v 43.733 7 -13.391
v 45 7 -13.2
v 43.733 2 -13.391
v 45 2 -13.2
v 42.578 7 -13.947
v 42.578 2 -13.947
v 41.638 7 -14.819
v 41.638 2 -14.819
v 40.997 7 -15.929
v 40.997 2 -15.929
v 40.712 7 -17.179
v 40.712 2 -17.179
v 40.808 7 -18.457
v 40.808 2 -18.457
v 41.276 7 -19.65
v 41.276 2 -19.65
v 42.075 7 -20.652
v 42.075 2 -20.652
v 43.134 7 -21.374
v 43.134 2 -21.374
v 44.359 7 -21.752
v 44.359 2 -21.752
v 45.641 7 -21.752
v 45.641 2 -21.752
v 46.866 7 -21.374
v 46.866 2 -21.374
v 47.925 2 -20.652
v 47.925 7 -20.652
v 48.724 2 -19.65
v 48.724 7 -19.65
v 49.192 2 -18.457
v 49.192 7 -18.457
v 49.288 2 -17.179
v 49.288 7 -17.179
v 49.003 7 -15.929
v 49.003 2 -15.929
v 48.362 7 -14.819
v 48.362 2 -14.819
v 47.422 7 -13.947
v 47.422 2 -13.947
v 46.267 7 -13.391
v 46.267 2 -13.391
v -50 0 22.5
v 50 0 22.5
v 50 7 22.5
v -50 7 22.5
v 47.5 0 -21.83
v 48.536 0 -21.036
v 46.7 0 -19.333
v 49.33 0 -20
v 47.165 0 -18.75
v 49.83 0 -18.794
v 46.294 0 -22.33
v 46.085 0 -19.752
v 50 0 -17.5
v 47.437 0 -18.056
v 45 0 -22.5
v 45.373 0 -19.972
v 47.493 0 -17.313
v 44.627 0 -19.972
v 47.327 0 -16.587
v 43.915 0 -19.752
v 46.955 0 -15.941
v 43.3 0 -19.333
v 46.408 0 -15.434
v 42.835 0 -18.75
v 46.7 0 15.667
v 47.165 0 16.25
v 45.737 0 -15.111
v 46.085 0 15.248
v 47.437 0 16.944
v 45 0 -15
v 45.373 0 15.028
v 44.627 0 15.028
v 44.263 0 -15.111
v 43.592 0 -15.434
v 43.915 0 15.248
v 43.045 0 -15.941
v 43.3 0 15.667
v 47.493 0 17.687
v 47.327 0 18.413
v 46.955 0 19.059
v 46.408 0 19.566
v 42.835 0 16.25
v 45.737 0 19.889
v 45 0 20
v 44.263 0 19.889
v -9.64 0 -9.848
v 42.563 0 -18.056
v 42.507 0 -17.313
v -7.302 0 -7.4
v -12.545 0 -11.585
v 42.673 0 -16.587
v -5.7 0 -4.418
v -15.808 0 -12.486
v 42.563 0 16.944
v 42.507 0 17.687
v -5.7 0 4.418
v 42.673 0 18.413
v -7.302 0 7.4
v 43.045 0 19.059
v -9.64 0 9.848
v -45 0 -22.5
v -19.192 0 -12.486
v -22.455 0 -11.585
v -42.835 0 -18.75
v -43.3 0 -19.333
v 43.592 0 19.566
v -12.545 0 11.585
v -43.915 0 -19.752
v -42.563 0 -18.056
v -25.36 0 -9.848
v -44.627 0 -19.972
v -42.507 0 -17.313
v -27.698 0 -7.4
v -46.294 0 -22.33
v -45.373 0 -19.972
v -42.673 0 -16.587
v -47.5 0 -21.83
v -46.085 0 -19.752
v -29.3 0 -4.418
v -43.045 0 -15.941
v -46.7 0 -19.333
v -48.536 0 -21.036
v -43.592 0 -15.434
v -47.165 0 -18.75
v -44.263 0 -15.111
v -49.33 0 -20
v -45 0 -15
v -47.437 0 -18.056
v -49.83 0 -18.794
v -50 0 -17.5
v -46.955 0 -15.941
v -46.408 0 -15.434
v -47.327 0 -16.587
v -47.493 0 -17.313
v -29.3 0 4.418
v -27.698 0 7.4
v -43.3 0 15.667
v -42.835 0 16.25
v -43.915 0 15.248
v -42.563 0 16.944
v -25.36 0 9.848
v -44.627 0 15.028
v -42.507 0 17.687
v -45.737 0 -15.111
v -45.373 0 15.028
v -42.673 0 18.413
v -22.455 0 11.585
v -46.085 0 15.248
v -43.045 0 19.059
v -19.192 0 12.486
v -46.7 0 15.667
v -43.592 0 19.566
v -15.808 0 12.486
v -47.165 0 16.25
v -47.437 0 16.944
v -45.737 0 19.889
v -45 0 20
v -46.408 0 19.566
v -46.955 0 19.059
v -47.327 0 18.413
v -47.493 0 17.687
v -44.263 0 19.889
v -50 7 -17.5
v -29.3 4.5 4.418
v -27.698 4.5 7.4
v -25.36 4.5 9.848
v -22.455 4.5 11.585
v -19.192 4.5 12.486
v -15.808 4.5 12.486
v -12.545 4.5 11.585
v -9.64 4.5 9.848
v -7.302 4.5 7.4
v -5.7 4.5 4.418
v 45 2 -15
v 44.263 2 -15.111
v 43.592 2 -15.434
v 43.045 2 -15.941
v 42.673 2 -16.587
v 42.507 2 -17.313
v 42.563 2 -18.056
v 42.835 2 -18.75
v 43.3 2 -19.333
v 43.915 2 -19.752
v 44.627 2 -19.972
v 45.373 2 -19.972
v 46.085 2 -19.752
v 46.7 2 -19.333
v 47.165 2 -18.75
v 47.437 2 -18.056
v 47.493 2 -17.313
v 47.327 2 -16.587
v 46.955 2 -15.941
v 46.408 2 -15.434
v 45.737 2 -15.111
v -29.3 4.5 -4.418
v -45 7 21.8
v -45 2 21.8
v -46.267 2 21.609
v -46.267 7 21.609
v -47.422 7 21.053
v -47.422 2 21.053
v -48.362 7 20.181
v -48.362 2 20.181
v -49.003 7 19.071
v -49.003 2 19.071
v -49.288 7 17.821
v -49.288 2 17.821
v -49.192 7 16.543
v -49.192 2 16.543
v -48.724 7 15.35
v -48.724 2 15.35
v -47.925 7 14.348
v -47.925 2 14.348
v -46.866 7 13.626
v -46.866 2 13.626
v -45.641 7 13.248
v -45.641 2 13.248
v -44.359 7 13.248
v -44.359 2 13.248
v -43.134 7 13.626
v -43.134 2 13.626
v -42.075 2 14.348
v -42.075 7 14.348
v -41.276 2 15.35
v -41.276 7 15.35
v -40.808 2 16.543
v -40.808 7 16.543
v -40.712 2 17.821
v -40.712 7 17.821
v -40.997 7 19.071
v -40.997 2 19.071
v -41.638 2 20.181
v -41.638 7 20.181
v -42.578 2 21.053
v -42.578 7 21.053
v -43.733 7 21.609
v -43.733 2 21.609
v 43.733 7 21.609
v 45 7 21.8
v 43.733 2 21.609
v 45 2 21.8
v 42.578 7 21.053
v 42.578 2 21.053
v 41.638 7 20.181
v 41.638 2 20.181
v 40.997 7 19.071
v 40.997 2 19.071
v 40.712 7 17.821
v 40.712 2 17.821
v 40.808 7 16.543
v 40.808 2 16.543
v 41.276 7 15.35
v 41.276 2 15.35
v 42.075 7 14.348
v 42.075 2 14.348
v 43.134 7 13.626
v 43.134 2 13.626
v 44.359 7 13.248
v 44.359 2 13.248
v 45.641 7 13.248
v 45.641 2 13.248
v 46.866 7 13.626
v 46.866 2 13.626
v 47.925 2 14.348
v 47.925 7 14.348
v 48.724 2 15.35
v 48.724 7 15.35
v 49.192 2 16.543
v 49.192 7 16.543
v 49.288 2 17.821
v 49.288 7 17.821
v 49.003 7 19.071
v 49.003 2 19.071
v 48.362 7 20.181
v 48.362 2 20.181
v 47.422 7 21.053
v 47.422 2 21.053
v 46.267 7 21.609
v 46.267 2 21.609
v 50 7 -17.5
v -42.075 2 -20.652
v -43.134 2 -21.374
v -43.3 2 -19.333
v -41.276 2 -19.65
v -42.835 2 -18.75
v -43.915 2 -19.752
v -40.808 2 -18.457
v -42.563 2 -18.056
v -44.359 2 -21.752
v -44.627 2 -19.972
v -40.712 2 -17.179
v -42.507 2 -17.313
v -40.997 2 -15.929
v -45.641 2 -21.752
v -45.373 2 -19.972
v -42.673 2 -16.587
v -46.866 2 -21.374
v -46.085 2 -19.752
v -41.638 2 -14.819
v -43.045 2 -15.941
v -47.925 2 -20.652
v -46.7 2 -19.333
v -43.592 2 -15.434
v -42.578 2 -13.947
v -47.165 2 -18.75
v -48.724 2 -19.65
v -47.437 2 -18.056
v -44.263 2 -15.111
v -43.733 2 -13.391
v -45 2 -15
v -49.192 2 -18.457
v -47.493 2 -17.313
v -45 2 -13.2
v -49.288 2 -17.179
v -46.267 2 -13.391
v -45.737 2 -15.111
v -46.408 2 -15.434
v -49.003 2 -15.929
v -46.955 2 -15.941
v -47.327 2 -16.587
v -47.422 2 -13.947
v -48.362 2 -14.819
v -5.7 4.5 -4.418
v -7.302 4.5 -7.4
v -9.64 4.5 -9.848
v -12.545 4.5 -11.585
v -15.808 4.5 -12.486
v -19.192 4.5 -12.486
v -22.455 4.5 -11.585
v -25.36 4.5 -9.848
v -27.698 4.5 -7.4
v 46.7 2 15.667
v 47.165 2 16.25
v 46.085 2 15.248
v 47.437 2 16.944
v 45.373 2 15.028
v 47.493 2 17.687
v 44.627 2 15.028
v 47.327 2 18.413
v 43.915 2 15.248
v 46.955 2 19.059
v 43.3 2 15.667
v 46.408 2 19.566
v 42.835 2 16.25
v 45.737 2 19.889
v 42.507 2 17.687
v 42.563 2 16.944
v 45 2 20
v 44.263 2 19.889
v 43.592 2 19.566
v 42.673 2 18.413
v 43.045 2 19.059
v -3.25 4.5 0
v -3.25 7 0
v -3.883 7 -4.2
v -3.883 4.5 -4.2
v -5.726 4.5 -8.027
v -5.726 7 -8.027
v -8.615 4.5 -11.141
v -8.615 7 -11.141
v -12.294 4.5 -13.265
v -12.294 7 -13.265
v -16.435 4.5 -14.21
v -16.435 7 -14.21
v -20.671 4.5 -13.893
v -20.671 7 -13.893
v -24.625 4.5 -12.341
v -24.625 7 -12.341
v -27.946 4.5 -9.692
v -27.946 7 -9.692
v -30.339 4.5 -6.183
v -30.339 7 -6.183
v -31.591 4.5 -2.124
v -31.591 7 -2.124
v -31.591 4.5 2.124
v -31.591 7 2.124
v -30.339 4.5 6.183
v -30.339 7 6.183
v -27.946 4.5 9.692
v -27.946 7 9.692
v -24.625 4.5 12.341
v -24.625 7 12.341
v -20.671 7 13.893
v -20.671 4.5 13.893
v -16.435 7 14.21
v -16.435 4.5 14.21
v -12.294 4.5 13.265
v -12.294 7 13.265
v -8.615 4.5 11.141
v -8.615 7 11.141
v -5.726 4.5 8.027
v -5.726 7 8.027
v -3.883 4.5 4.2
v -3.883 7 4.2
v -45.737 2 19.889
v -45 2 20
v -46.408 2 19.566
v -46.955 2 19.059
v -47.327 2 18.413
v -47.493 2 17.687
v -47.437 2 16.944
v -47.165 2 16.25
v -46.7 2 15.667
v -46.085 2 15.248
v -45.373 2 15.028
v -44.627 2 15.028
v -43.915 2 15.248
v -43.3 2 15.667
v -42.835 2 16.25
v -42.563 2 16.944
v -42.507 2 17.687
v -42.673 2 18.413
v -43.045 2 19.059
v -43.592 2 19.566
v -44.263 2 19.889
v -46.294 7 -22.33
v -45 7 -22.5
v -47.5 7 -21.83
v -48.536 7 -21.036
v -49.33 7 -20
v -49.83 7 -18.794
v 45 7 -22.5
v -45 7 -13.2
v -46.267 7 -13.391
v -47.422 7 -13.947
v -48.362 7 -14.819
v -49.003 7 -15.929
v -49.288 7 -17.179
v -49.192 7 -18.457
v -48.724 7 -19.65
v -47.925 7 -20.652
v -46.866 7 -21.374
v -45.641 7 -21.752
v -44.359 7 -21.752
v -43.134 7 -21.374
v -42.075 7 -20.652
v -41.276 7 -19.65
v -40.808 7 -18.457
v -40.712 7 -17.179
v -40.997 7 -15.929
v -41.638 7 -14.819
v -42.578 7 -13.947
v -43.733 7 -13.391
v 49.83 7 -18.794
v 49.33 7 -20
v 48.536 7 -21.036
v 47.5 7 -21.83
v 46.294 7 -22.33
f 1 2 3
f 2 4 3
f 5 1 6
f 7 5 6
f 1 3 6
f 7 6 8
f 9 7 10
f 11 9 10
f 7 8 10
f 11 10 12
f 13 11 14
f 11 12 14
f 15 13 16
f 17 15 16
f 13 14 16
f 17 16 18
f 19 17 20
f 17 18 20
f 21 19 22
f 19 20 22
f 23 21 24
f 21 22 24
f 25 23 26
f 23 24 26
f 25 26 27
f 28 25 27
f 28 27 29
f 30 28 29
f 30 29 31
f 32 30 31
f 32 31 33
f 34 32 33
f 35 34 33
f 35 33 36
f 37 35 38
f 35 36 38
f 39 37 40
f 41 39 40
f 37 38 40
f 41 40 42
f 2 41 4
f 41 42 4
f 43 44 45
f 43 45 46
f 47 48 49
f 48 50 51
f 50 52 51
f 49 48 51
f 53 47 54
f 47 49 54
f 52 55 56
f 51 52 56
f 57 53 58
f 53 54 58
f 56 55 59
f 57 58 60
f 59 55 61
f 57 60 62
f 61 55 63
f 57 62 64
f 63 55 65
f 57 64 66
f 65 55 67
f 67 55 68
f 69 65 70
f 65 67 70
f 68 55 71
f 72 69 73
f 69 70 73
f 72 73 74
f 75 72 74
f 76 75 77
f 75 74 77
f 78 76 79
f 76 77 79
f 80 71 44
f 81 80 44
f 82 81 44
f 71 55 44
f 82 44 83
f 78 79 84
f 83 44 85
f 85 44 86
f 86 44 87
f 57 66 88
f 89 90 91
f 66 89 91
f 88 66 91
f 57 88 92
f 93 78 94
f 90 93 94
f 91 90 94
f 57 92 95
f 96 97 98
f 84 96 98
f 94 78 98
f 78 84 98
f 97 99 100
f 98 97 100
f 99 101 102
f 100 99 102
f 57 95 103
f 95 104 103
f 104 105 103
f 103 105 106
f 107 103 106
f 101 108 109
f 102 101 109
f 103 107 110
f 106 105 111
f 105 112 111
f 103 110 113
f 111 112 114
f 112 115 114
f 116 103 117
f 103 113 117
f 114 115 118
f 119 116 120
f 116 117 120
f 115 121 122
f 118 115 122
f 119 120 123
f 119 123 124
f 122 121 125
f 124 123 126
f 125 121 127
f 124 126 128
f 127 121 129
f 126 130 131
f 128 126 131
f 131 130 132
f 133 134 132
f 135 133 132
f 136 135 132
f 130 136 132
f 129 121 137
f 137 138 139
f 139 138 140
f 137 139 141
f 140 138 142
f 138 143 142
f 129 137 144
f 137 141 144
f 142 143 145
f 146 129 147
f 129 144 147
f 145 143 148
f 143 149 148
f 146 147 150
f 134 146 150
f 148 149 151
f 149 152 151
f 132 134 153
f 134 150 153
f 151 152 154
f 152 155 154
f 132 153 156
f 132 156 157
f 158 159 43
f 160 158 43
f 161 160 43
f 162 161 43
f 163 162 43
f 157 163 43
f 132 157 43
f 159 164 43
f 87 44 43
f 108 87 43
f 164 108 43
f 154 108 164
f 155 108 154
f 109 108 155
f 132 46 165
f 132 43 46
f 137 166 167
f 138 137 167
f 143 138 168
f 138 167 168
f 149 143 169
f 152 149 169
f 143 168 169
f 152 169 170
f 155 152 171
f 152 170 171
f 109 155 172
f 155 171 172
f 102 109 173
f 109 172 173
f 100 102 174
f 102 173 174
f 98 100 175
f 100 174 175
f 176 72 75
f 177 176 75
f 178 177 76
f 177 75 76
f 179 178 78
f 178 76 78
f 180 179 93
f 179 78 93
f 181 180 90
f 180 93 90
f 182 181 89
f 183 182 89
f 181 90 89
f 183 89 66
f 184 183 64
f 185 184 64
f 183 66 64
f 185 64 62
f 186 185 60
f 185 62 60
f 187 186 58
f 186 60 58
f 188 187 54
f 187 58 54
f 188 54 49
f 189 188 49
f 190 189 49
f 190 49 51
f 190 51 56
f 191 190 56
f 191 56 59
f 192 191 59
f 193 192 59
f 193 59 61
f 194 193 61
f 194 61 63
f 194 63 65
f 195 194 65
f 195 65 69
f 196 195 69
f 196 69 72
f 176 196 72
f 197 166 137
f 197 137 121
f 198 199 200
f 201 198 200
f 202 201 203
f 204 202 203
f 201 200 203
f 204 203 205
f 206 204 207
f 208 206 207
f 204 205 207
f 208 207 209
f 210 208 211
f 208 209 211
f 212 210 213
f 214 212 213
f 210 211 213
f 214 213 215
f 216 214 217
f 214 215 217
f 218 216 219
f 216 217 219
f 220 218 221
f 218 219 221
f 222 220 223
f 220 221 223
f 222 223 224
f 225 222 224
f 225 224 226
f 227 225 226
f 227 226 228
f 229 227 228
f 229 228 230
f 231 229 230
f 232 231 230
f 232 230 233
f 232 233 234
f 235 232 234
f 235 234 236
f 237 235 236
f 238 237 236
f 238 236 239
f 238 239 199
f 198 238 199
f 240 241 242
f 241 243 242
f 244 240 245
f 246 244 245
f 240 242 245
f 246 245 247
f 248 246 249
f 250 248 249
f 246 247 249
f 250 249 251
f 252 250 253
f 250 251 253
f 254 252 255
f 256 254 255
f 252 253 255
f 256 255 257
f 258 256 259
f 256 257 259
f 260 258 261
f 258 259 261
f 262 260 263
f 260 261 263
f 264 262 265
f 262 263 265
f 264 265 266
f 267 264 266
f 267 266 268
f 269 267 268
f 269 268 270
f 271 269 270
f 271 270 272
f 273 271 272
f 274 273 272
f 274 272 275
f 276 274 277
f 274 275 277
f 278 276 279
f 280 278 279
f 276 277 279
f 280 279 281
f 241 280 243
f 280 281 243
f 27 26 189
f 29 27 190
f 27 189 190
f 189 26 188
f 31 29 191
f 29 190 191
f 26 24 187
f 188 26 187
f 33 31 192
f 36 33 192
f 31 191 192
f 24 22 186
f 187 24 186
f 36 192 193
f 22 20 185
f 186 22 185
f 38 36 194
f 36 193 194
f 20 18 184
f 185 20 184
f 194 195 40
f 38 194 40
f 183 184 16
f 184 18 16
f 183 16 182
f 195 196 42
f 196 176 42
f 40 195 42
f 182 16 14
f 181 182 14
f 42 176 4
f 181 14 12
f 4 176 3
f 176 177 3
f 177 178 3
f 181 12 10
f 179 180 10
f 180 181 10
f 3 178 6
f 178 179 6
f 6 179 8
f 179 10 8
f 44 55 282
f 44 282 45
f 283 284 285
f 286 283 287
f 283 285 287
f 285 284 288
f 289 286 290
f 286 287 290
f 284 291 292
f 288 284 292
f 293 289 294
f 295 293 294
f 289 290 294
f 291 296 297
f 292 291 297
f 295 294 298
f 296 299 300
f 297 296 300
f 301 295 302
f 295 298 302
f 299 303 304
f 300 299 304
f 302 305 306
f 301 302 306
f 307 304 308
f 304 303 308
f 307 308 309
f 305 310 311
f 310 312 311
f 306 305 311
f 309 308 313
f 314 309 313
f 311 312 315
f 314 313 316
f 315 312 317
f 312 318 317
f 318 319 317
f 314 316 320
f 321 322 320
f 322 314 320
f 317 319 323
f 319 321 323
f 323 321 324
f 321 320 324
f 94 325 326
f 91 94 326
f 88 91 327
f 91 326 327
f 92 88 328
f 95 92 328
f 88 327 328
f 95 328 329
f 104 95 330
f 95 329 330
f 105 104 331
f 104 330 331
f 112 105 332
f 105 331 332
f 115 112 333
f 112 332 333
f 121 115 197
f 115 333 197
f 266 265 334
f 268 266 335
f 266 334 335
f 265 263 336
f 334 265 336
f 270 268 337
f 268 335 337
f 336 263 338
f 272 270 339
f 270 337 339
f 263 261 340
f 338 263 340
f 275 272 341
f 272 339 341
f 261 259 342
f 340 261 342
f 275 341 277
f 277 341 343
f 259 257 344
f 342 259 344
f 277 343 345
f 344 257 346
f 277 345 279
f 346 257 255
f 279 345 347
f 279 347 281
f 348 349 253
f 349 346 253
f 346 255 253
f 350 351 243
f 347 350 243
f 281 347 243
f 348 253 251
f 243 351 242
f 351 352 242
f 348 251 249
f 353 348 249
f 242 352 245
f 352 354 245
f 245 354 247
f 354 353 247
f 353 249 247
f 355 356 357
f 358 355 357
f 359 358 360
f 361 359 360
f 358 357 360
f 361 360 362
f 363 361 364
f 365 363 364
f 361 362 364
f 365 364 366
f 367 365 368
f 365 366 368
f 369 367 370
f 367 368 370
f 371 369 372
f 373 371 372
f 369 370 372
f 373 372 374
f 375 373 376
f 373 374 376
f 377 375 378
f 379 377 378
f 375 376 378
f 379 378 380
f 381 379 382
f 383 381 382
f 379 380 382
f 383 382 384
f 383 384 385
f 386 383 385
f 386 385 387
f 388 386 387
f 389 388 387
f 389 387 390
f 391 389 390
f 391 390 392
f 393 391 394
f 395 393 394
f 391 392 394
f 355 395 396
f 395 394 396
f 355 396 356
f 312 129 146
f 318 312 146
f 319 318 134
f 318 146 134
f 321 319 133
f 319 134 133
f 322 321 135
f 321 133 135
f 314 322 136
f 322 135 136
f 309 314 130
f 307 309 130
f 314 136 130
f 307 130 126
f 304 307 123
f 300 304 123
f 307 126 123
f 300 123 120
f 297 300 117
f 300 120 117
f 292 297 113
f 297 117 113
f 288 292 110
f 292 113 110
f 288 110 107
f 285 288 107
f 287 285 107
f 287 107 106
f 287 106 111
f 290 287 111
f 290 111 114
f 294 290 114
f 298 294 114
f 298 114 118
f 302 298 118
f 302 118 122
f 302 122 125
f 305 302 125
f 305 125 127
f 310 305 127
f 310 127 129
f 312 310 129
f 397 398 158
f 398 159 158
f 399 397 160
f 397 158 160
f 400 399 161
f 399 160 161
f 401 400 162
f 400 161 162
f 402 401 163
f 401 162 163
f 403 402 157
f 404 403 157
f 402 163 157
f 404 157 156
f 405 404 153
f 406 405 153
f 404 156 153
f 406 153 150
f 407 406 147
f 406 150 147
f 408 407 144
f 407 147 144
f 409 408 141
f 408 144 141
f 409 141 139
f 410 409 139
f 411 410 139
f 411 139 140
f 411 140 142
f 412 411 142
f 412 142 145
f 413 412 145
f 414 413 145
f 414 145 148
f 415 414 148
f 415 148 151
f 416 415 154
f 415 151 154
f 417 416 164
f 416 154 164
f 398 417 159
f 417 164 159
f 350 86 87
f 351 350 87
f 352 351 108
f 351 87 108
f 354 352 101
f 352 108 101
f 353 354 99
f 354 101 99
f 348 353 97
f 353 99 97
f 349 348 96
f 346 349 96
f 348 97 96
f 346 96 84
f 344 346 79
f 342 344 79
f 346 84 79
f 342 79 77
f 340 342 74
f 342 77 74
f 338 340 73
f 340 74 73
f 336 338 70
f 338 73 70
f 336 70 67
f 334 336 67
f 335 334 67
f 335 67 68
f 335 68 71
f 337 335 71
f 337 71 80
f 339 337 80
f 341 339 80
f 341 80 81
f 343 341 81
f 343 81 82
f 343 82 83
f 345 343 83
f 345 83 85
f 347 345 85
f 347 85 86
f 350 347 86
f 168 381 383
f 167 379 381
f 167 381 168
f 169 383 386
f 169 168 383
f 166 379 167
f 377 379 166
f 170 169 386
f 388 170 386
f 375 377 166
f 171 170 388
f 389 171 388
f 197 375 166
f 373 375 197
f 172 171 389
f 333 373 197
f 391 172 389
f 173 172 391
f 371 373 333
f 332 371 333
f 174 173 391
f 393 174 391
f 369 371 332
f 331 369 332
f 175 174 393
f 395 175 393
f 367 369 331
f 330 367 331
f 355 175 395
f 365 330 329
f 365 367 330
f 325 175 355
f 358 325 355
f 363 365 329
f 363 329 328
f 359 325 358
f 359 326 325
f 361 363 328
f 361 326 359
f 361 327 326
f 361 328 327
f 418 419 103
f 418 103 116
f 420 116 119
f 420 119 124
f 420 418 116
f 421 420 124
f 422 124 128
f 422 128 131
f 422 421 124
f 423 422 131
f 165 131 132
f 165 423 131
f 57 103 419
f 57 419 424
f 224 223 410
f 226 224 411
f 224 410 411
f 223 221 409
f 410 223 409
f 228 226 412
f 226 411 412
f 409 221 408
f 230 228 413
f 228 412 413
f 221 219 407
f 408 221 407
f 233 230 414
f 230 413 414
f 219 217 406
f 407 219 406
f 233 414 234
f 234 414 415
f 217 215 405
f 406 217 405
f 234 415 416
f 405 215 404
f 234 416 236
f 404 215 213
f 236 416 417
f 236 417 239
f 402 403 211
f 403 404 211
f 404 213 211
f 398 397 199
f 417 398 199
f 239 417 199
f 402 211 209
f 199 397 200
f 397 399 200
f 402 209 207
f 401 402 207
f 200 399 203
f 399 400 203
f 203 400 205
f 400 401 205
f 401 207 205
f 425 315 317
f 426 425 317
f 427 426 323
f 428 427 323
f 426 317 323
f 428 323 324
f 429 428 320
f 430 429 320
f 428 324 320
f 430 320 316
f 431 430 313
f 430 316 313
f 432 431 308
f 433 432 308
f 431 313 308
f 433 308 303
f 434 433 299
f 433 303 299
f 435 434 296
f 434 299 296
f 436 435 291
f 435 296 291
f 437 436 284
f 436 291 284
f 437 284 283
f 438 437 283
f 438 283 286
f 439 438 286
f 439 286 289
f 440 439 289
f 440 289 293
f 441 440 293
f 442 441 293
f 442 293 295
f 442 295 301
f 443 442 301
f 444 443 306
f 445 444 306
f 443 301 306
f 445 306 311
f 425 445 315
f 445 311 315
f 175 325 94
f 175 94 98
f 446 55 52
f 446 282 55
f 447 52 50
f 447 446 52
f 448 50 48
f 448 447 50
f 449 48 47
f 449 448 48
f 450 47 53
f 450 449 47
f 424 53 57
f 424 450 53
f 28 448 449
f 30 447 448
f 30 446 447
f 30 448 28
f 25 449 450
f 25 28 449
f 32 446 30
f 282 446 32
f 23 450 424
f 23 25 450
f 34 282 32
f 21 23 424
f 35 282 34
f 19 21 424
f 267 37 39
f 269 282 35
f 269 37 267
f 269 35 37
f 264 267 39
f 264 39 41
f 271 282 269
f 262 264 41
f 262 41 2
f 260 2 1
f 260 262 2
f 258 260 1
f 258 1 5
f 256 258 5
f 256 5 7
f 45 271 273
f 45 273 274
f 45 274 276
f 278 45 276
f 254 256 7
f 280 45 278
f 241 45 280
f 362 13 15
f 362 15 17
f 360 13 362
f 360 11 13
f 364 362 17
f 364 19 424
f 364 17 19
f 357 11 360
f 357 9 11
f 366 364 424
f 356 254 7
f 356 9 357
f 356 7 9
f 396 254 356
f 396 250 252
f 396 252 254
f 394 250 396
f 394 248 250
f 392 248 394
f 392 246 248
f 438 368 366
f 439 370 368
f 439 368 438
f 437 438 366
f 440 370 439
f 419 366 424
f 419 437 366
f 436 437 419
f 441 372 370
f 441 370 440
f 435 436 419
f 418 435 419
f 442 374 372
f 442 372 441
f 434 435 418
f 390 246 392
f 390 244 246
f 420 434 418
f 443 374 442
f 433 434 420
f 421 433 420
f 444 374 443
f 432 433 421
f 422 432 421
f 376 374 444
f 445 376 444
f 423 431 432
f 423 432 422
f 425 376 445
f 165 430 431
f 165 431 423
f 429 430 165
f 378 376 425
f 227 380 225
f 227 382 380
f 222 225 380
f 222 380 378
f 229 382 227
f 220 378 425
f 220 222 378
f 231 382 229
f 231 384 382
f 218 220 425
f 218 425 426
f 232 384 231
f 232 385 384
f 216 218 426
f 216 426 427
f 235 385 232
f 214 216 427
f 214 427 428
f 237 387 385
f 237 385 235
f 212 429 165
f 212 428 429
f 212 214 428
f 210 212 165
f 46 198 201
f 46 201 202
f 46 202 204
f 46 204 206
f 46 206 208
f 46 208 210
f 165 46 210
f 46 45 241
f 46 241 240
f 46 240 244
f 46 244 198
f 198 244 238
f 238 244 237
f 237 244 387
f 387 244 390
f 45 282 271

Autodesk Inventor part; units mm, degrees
ref_plane "YZ Plane" through (0, 0, 0) normal (1, 0, 0) x (0, 1, 0)
ref_plane "XZ Plane" through (0, 0, 0) normal (0, 1, 0) x (-1, 0, 0)
ref_plane "XY Plane" through (0, 0, 0) normal (0, 0, 1) x (1, 0, 0)
sketch "Body Outline" plane through (0, 0, 0) normal (0, 1, 0) x (-1, 0, 0)
  line L0 (50, -22.5) -> (-50, -22.5)
  line L1 (-50, -22.5) -> (-50, 22.5)
  line L2 (-50, 22.5) -> (50, 22.5)
  line L3 (50, 22.5) -> (50, -22.5)
  point P0 (0, 0)
  dimension "d0" = 45
  dimension "d1" = 22.5
  dimension "d2" = 100
  dimension "d3" = 50
extrude "Body" add sketch "Body Outline" along normal blind 7
sketch "Connector Hole Cross Section" plane through (0, 7, 0) normal (0, 1, 0) x (1, 0, 0)
  line L0 (-5.7, 4.4181) -> (-5.7, -4.4181)
  line L1 (-29.3, -4.4181) -> (-29.3, 4.4181)
  arc A0 (-5.7, 4.4181) -> (-29.3, 4.4181) centre (-17.5, 0) ccw
  arc A1 (-29.3, -4.4181) -> (-5.7, -4.4181) centre (-17.5, 0) ccw
  line L2 (50, 22.5) -> (-50, 22.5) projected
  line L3 (-50, 22.5) -> (-50, -22.5) projected
  point P0 (0, 0)
  dimension "d6" = 11.8
  dimension "d7" = 23.6
  dimension "d8" = 12.6
  dimension "d9" = 12.6
  dimension "d10" = 22.5
  dimension "d12" = 32.5
extrude "Connector Hole" cut sketch "Connector Hole Cross Section" along normal through all both and the other way through all
sketch "Connector Face Hole Cross Section" plane through (0, 7, 0) normal (0, 1, 0) x (1, 0, 0)
  circle A0 centre (-17.5, 0) radius 14.25
  line L0 (50, 22.5) -> (-50, 22.5) projected
  line L1 (-50, 22.5) -> (-50, -22.5) projected
  point P0 (0, 0)
  dimension "d15" = 22.5
  dimension "d16" = 32.5
  dimension "d17" = 28.5
extrude "Connector Face Hole" cut sketch "Connector Face Hole Cross Section" against normal blind 2.5
fillet "Body Fillet" radius 5 2 edges at (-50, 3.5, -22.5) (50, 3.5, -22.5)
sketch "Lid Fastening Hole Pattern" plane through (0, 7, 0) normal (0, 1, 0) x (1, 0, 0)
  line L0 (-50, 17.5) -> (-50, -22.5) projected
  line L1 (45, 22.5) -> (-45, 22.5) projected
  point P0 (0, 0)
  point P1 (-45, 17.5)
  point P2 (45, 17.5)
  point P3 (-45, -17.5)
  point P4 (45, -17.5)
  dimension "d85" = 5
  dimension "d86" = 5
  dimension "d89" = 90
  dimension "d92" = 35
hole "Lid Fastening Holes" at (-45, 7, -17.5) at (45, 7, -17.5) at (-45, 7, 17.5) at (45, 7, 17.5) direction (0, -1, 0) diameter 5 end through all counterbore diameter 8.6 counterbore depth 5
equation "\"d1\" = 0.5 * d0"
equation "\"d3\" = 0.5 * d2"
equation "\"d6\" = 0.5 * d7"
equation "\"d9\" = d8"
equation "\"d10\" = 0.5 * d0"
equation "\"d15\" = 0.5 * d0"
equation "\"d85\" = d86"
properties part number "Connector Lid" material "Aluminum 6061"
